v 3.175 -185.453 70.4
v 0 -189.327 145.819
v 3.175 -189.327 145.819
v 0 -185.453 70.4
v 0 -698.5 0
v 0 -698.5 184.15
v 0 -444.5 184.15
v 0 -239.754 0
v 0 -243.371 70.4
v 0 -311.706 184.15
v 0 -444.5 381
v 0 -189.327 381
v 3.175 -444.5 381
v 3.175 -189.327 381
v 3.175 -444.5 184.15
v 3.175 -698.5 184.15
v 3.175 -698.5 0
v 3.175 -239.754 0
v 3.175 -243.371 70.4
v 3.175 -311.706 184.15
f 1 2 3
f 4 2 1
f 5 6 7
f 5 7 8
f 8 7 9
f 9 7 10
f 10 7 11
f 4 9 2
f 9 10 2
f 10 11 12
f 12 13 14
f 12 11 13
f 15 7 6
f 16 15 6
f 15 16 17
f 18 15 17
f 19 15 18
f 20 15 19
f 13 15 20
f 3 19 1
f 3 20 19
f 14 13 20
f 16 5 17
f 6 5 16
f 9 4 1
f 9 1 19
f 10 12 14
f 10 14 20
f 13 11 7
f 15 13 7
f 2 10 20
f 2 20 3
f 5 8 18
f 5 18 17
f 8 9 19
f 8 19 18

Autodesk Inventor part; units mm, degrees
ref_plane "YZ Plane" through (0, 0, 0) normal (1, 0, 0) x (0, 1, 0)
ref_plane "XZ Plane" through (0, 0, 0) normal (0, 1, 0) x (-1, 0, 0)
ref_plane "XY Plane" through (0, 0, 0) normal (0, 0, 1) x (1, 0, 0)
sketch "Sketch1" plane through (0, 0, 0) normal (1, 0, 0) x (0, 1, 0)
  line L0 (0, 0) -> (-698.5, 0)
  line L1 (-698.5, 0) -> (-698.5, 381)
  line L2 (-698.5, 381) -> (0, 381)
  line L3 (0, 381) -> (0, 0)
  line L4 (-444.5, 381) -> (-444.5, 184.15)
  line L5 (-444.5, 184.15) -> (-698.5, 184.15)
  line L6 (-189.3272, 381) -> (-311.7065, 184.15)
  line L7 (-311.7065, 184.15) -> (-189.3272, 145.8189)
  line L8 (-189.3272, 145.8189) -> (-185.4527, 70.4)
  line L9 (-185.4527, 70.4) -> (-243.3711, 70.4)
  line L10 (-243.3711, 70.4) -> (-239.7544, 0)
  dimension "d0" = 698.5
  dimension "d1" = 381
  dimension "d3" = 254
  dimension "d4" = 196.85
extrude "Plate1" add sketch "Sketch1" along normal blind 3.175 contours L0 L1 L5 L4 L2 L6 L7 L8 L9 L10
equation "\"d2\" = Thickness"
equation "\"BendRadius\" = Thickness"
equation "\"BendReliefWidth\" = Thickness"
equation "\"BendReliefDepth\" = 0.5 * Thickness"
equation "\"CornerReliefSize\" = 4 * Thickness"
equation "\"MinimumRemnant\" = 2 * Thickness"
equation "\"TransitionRadius\" = BendRadius"
equation "\"JacobiRadiusSize\" = BendRadius"
equation "\"GapSize\" = Thickness"
equation "\"Thickness\" = 3.175"
properties part number "PLATE,HOPPER,BACK2" material "Polycarbonate, Clear"
